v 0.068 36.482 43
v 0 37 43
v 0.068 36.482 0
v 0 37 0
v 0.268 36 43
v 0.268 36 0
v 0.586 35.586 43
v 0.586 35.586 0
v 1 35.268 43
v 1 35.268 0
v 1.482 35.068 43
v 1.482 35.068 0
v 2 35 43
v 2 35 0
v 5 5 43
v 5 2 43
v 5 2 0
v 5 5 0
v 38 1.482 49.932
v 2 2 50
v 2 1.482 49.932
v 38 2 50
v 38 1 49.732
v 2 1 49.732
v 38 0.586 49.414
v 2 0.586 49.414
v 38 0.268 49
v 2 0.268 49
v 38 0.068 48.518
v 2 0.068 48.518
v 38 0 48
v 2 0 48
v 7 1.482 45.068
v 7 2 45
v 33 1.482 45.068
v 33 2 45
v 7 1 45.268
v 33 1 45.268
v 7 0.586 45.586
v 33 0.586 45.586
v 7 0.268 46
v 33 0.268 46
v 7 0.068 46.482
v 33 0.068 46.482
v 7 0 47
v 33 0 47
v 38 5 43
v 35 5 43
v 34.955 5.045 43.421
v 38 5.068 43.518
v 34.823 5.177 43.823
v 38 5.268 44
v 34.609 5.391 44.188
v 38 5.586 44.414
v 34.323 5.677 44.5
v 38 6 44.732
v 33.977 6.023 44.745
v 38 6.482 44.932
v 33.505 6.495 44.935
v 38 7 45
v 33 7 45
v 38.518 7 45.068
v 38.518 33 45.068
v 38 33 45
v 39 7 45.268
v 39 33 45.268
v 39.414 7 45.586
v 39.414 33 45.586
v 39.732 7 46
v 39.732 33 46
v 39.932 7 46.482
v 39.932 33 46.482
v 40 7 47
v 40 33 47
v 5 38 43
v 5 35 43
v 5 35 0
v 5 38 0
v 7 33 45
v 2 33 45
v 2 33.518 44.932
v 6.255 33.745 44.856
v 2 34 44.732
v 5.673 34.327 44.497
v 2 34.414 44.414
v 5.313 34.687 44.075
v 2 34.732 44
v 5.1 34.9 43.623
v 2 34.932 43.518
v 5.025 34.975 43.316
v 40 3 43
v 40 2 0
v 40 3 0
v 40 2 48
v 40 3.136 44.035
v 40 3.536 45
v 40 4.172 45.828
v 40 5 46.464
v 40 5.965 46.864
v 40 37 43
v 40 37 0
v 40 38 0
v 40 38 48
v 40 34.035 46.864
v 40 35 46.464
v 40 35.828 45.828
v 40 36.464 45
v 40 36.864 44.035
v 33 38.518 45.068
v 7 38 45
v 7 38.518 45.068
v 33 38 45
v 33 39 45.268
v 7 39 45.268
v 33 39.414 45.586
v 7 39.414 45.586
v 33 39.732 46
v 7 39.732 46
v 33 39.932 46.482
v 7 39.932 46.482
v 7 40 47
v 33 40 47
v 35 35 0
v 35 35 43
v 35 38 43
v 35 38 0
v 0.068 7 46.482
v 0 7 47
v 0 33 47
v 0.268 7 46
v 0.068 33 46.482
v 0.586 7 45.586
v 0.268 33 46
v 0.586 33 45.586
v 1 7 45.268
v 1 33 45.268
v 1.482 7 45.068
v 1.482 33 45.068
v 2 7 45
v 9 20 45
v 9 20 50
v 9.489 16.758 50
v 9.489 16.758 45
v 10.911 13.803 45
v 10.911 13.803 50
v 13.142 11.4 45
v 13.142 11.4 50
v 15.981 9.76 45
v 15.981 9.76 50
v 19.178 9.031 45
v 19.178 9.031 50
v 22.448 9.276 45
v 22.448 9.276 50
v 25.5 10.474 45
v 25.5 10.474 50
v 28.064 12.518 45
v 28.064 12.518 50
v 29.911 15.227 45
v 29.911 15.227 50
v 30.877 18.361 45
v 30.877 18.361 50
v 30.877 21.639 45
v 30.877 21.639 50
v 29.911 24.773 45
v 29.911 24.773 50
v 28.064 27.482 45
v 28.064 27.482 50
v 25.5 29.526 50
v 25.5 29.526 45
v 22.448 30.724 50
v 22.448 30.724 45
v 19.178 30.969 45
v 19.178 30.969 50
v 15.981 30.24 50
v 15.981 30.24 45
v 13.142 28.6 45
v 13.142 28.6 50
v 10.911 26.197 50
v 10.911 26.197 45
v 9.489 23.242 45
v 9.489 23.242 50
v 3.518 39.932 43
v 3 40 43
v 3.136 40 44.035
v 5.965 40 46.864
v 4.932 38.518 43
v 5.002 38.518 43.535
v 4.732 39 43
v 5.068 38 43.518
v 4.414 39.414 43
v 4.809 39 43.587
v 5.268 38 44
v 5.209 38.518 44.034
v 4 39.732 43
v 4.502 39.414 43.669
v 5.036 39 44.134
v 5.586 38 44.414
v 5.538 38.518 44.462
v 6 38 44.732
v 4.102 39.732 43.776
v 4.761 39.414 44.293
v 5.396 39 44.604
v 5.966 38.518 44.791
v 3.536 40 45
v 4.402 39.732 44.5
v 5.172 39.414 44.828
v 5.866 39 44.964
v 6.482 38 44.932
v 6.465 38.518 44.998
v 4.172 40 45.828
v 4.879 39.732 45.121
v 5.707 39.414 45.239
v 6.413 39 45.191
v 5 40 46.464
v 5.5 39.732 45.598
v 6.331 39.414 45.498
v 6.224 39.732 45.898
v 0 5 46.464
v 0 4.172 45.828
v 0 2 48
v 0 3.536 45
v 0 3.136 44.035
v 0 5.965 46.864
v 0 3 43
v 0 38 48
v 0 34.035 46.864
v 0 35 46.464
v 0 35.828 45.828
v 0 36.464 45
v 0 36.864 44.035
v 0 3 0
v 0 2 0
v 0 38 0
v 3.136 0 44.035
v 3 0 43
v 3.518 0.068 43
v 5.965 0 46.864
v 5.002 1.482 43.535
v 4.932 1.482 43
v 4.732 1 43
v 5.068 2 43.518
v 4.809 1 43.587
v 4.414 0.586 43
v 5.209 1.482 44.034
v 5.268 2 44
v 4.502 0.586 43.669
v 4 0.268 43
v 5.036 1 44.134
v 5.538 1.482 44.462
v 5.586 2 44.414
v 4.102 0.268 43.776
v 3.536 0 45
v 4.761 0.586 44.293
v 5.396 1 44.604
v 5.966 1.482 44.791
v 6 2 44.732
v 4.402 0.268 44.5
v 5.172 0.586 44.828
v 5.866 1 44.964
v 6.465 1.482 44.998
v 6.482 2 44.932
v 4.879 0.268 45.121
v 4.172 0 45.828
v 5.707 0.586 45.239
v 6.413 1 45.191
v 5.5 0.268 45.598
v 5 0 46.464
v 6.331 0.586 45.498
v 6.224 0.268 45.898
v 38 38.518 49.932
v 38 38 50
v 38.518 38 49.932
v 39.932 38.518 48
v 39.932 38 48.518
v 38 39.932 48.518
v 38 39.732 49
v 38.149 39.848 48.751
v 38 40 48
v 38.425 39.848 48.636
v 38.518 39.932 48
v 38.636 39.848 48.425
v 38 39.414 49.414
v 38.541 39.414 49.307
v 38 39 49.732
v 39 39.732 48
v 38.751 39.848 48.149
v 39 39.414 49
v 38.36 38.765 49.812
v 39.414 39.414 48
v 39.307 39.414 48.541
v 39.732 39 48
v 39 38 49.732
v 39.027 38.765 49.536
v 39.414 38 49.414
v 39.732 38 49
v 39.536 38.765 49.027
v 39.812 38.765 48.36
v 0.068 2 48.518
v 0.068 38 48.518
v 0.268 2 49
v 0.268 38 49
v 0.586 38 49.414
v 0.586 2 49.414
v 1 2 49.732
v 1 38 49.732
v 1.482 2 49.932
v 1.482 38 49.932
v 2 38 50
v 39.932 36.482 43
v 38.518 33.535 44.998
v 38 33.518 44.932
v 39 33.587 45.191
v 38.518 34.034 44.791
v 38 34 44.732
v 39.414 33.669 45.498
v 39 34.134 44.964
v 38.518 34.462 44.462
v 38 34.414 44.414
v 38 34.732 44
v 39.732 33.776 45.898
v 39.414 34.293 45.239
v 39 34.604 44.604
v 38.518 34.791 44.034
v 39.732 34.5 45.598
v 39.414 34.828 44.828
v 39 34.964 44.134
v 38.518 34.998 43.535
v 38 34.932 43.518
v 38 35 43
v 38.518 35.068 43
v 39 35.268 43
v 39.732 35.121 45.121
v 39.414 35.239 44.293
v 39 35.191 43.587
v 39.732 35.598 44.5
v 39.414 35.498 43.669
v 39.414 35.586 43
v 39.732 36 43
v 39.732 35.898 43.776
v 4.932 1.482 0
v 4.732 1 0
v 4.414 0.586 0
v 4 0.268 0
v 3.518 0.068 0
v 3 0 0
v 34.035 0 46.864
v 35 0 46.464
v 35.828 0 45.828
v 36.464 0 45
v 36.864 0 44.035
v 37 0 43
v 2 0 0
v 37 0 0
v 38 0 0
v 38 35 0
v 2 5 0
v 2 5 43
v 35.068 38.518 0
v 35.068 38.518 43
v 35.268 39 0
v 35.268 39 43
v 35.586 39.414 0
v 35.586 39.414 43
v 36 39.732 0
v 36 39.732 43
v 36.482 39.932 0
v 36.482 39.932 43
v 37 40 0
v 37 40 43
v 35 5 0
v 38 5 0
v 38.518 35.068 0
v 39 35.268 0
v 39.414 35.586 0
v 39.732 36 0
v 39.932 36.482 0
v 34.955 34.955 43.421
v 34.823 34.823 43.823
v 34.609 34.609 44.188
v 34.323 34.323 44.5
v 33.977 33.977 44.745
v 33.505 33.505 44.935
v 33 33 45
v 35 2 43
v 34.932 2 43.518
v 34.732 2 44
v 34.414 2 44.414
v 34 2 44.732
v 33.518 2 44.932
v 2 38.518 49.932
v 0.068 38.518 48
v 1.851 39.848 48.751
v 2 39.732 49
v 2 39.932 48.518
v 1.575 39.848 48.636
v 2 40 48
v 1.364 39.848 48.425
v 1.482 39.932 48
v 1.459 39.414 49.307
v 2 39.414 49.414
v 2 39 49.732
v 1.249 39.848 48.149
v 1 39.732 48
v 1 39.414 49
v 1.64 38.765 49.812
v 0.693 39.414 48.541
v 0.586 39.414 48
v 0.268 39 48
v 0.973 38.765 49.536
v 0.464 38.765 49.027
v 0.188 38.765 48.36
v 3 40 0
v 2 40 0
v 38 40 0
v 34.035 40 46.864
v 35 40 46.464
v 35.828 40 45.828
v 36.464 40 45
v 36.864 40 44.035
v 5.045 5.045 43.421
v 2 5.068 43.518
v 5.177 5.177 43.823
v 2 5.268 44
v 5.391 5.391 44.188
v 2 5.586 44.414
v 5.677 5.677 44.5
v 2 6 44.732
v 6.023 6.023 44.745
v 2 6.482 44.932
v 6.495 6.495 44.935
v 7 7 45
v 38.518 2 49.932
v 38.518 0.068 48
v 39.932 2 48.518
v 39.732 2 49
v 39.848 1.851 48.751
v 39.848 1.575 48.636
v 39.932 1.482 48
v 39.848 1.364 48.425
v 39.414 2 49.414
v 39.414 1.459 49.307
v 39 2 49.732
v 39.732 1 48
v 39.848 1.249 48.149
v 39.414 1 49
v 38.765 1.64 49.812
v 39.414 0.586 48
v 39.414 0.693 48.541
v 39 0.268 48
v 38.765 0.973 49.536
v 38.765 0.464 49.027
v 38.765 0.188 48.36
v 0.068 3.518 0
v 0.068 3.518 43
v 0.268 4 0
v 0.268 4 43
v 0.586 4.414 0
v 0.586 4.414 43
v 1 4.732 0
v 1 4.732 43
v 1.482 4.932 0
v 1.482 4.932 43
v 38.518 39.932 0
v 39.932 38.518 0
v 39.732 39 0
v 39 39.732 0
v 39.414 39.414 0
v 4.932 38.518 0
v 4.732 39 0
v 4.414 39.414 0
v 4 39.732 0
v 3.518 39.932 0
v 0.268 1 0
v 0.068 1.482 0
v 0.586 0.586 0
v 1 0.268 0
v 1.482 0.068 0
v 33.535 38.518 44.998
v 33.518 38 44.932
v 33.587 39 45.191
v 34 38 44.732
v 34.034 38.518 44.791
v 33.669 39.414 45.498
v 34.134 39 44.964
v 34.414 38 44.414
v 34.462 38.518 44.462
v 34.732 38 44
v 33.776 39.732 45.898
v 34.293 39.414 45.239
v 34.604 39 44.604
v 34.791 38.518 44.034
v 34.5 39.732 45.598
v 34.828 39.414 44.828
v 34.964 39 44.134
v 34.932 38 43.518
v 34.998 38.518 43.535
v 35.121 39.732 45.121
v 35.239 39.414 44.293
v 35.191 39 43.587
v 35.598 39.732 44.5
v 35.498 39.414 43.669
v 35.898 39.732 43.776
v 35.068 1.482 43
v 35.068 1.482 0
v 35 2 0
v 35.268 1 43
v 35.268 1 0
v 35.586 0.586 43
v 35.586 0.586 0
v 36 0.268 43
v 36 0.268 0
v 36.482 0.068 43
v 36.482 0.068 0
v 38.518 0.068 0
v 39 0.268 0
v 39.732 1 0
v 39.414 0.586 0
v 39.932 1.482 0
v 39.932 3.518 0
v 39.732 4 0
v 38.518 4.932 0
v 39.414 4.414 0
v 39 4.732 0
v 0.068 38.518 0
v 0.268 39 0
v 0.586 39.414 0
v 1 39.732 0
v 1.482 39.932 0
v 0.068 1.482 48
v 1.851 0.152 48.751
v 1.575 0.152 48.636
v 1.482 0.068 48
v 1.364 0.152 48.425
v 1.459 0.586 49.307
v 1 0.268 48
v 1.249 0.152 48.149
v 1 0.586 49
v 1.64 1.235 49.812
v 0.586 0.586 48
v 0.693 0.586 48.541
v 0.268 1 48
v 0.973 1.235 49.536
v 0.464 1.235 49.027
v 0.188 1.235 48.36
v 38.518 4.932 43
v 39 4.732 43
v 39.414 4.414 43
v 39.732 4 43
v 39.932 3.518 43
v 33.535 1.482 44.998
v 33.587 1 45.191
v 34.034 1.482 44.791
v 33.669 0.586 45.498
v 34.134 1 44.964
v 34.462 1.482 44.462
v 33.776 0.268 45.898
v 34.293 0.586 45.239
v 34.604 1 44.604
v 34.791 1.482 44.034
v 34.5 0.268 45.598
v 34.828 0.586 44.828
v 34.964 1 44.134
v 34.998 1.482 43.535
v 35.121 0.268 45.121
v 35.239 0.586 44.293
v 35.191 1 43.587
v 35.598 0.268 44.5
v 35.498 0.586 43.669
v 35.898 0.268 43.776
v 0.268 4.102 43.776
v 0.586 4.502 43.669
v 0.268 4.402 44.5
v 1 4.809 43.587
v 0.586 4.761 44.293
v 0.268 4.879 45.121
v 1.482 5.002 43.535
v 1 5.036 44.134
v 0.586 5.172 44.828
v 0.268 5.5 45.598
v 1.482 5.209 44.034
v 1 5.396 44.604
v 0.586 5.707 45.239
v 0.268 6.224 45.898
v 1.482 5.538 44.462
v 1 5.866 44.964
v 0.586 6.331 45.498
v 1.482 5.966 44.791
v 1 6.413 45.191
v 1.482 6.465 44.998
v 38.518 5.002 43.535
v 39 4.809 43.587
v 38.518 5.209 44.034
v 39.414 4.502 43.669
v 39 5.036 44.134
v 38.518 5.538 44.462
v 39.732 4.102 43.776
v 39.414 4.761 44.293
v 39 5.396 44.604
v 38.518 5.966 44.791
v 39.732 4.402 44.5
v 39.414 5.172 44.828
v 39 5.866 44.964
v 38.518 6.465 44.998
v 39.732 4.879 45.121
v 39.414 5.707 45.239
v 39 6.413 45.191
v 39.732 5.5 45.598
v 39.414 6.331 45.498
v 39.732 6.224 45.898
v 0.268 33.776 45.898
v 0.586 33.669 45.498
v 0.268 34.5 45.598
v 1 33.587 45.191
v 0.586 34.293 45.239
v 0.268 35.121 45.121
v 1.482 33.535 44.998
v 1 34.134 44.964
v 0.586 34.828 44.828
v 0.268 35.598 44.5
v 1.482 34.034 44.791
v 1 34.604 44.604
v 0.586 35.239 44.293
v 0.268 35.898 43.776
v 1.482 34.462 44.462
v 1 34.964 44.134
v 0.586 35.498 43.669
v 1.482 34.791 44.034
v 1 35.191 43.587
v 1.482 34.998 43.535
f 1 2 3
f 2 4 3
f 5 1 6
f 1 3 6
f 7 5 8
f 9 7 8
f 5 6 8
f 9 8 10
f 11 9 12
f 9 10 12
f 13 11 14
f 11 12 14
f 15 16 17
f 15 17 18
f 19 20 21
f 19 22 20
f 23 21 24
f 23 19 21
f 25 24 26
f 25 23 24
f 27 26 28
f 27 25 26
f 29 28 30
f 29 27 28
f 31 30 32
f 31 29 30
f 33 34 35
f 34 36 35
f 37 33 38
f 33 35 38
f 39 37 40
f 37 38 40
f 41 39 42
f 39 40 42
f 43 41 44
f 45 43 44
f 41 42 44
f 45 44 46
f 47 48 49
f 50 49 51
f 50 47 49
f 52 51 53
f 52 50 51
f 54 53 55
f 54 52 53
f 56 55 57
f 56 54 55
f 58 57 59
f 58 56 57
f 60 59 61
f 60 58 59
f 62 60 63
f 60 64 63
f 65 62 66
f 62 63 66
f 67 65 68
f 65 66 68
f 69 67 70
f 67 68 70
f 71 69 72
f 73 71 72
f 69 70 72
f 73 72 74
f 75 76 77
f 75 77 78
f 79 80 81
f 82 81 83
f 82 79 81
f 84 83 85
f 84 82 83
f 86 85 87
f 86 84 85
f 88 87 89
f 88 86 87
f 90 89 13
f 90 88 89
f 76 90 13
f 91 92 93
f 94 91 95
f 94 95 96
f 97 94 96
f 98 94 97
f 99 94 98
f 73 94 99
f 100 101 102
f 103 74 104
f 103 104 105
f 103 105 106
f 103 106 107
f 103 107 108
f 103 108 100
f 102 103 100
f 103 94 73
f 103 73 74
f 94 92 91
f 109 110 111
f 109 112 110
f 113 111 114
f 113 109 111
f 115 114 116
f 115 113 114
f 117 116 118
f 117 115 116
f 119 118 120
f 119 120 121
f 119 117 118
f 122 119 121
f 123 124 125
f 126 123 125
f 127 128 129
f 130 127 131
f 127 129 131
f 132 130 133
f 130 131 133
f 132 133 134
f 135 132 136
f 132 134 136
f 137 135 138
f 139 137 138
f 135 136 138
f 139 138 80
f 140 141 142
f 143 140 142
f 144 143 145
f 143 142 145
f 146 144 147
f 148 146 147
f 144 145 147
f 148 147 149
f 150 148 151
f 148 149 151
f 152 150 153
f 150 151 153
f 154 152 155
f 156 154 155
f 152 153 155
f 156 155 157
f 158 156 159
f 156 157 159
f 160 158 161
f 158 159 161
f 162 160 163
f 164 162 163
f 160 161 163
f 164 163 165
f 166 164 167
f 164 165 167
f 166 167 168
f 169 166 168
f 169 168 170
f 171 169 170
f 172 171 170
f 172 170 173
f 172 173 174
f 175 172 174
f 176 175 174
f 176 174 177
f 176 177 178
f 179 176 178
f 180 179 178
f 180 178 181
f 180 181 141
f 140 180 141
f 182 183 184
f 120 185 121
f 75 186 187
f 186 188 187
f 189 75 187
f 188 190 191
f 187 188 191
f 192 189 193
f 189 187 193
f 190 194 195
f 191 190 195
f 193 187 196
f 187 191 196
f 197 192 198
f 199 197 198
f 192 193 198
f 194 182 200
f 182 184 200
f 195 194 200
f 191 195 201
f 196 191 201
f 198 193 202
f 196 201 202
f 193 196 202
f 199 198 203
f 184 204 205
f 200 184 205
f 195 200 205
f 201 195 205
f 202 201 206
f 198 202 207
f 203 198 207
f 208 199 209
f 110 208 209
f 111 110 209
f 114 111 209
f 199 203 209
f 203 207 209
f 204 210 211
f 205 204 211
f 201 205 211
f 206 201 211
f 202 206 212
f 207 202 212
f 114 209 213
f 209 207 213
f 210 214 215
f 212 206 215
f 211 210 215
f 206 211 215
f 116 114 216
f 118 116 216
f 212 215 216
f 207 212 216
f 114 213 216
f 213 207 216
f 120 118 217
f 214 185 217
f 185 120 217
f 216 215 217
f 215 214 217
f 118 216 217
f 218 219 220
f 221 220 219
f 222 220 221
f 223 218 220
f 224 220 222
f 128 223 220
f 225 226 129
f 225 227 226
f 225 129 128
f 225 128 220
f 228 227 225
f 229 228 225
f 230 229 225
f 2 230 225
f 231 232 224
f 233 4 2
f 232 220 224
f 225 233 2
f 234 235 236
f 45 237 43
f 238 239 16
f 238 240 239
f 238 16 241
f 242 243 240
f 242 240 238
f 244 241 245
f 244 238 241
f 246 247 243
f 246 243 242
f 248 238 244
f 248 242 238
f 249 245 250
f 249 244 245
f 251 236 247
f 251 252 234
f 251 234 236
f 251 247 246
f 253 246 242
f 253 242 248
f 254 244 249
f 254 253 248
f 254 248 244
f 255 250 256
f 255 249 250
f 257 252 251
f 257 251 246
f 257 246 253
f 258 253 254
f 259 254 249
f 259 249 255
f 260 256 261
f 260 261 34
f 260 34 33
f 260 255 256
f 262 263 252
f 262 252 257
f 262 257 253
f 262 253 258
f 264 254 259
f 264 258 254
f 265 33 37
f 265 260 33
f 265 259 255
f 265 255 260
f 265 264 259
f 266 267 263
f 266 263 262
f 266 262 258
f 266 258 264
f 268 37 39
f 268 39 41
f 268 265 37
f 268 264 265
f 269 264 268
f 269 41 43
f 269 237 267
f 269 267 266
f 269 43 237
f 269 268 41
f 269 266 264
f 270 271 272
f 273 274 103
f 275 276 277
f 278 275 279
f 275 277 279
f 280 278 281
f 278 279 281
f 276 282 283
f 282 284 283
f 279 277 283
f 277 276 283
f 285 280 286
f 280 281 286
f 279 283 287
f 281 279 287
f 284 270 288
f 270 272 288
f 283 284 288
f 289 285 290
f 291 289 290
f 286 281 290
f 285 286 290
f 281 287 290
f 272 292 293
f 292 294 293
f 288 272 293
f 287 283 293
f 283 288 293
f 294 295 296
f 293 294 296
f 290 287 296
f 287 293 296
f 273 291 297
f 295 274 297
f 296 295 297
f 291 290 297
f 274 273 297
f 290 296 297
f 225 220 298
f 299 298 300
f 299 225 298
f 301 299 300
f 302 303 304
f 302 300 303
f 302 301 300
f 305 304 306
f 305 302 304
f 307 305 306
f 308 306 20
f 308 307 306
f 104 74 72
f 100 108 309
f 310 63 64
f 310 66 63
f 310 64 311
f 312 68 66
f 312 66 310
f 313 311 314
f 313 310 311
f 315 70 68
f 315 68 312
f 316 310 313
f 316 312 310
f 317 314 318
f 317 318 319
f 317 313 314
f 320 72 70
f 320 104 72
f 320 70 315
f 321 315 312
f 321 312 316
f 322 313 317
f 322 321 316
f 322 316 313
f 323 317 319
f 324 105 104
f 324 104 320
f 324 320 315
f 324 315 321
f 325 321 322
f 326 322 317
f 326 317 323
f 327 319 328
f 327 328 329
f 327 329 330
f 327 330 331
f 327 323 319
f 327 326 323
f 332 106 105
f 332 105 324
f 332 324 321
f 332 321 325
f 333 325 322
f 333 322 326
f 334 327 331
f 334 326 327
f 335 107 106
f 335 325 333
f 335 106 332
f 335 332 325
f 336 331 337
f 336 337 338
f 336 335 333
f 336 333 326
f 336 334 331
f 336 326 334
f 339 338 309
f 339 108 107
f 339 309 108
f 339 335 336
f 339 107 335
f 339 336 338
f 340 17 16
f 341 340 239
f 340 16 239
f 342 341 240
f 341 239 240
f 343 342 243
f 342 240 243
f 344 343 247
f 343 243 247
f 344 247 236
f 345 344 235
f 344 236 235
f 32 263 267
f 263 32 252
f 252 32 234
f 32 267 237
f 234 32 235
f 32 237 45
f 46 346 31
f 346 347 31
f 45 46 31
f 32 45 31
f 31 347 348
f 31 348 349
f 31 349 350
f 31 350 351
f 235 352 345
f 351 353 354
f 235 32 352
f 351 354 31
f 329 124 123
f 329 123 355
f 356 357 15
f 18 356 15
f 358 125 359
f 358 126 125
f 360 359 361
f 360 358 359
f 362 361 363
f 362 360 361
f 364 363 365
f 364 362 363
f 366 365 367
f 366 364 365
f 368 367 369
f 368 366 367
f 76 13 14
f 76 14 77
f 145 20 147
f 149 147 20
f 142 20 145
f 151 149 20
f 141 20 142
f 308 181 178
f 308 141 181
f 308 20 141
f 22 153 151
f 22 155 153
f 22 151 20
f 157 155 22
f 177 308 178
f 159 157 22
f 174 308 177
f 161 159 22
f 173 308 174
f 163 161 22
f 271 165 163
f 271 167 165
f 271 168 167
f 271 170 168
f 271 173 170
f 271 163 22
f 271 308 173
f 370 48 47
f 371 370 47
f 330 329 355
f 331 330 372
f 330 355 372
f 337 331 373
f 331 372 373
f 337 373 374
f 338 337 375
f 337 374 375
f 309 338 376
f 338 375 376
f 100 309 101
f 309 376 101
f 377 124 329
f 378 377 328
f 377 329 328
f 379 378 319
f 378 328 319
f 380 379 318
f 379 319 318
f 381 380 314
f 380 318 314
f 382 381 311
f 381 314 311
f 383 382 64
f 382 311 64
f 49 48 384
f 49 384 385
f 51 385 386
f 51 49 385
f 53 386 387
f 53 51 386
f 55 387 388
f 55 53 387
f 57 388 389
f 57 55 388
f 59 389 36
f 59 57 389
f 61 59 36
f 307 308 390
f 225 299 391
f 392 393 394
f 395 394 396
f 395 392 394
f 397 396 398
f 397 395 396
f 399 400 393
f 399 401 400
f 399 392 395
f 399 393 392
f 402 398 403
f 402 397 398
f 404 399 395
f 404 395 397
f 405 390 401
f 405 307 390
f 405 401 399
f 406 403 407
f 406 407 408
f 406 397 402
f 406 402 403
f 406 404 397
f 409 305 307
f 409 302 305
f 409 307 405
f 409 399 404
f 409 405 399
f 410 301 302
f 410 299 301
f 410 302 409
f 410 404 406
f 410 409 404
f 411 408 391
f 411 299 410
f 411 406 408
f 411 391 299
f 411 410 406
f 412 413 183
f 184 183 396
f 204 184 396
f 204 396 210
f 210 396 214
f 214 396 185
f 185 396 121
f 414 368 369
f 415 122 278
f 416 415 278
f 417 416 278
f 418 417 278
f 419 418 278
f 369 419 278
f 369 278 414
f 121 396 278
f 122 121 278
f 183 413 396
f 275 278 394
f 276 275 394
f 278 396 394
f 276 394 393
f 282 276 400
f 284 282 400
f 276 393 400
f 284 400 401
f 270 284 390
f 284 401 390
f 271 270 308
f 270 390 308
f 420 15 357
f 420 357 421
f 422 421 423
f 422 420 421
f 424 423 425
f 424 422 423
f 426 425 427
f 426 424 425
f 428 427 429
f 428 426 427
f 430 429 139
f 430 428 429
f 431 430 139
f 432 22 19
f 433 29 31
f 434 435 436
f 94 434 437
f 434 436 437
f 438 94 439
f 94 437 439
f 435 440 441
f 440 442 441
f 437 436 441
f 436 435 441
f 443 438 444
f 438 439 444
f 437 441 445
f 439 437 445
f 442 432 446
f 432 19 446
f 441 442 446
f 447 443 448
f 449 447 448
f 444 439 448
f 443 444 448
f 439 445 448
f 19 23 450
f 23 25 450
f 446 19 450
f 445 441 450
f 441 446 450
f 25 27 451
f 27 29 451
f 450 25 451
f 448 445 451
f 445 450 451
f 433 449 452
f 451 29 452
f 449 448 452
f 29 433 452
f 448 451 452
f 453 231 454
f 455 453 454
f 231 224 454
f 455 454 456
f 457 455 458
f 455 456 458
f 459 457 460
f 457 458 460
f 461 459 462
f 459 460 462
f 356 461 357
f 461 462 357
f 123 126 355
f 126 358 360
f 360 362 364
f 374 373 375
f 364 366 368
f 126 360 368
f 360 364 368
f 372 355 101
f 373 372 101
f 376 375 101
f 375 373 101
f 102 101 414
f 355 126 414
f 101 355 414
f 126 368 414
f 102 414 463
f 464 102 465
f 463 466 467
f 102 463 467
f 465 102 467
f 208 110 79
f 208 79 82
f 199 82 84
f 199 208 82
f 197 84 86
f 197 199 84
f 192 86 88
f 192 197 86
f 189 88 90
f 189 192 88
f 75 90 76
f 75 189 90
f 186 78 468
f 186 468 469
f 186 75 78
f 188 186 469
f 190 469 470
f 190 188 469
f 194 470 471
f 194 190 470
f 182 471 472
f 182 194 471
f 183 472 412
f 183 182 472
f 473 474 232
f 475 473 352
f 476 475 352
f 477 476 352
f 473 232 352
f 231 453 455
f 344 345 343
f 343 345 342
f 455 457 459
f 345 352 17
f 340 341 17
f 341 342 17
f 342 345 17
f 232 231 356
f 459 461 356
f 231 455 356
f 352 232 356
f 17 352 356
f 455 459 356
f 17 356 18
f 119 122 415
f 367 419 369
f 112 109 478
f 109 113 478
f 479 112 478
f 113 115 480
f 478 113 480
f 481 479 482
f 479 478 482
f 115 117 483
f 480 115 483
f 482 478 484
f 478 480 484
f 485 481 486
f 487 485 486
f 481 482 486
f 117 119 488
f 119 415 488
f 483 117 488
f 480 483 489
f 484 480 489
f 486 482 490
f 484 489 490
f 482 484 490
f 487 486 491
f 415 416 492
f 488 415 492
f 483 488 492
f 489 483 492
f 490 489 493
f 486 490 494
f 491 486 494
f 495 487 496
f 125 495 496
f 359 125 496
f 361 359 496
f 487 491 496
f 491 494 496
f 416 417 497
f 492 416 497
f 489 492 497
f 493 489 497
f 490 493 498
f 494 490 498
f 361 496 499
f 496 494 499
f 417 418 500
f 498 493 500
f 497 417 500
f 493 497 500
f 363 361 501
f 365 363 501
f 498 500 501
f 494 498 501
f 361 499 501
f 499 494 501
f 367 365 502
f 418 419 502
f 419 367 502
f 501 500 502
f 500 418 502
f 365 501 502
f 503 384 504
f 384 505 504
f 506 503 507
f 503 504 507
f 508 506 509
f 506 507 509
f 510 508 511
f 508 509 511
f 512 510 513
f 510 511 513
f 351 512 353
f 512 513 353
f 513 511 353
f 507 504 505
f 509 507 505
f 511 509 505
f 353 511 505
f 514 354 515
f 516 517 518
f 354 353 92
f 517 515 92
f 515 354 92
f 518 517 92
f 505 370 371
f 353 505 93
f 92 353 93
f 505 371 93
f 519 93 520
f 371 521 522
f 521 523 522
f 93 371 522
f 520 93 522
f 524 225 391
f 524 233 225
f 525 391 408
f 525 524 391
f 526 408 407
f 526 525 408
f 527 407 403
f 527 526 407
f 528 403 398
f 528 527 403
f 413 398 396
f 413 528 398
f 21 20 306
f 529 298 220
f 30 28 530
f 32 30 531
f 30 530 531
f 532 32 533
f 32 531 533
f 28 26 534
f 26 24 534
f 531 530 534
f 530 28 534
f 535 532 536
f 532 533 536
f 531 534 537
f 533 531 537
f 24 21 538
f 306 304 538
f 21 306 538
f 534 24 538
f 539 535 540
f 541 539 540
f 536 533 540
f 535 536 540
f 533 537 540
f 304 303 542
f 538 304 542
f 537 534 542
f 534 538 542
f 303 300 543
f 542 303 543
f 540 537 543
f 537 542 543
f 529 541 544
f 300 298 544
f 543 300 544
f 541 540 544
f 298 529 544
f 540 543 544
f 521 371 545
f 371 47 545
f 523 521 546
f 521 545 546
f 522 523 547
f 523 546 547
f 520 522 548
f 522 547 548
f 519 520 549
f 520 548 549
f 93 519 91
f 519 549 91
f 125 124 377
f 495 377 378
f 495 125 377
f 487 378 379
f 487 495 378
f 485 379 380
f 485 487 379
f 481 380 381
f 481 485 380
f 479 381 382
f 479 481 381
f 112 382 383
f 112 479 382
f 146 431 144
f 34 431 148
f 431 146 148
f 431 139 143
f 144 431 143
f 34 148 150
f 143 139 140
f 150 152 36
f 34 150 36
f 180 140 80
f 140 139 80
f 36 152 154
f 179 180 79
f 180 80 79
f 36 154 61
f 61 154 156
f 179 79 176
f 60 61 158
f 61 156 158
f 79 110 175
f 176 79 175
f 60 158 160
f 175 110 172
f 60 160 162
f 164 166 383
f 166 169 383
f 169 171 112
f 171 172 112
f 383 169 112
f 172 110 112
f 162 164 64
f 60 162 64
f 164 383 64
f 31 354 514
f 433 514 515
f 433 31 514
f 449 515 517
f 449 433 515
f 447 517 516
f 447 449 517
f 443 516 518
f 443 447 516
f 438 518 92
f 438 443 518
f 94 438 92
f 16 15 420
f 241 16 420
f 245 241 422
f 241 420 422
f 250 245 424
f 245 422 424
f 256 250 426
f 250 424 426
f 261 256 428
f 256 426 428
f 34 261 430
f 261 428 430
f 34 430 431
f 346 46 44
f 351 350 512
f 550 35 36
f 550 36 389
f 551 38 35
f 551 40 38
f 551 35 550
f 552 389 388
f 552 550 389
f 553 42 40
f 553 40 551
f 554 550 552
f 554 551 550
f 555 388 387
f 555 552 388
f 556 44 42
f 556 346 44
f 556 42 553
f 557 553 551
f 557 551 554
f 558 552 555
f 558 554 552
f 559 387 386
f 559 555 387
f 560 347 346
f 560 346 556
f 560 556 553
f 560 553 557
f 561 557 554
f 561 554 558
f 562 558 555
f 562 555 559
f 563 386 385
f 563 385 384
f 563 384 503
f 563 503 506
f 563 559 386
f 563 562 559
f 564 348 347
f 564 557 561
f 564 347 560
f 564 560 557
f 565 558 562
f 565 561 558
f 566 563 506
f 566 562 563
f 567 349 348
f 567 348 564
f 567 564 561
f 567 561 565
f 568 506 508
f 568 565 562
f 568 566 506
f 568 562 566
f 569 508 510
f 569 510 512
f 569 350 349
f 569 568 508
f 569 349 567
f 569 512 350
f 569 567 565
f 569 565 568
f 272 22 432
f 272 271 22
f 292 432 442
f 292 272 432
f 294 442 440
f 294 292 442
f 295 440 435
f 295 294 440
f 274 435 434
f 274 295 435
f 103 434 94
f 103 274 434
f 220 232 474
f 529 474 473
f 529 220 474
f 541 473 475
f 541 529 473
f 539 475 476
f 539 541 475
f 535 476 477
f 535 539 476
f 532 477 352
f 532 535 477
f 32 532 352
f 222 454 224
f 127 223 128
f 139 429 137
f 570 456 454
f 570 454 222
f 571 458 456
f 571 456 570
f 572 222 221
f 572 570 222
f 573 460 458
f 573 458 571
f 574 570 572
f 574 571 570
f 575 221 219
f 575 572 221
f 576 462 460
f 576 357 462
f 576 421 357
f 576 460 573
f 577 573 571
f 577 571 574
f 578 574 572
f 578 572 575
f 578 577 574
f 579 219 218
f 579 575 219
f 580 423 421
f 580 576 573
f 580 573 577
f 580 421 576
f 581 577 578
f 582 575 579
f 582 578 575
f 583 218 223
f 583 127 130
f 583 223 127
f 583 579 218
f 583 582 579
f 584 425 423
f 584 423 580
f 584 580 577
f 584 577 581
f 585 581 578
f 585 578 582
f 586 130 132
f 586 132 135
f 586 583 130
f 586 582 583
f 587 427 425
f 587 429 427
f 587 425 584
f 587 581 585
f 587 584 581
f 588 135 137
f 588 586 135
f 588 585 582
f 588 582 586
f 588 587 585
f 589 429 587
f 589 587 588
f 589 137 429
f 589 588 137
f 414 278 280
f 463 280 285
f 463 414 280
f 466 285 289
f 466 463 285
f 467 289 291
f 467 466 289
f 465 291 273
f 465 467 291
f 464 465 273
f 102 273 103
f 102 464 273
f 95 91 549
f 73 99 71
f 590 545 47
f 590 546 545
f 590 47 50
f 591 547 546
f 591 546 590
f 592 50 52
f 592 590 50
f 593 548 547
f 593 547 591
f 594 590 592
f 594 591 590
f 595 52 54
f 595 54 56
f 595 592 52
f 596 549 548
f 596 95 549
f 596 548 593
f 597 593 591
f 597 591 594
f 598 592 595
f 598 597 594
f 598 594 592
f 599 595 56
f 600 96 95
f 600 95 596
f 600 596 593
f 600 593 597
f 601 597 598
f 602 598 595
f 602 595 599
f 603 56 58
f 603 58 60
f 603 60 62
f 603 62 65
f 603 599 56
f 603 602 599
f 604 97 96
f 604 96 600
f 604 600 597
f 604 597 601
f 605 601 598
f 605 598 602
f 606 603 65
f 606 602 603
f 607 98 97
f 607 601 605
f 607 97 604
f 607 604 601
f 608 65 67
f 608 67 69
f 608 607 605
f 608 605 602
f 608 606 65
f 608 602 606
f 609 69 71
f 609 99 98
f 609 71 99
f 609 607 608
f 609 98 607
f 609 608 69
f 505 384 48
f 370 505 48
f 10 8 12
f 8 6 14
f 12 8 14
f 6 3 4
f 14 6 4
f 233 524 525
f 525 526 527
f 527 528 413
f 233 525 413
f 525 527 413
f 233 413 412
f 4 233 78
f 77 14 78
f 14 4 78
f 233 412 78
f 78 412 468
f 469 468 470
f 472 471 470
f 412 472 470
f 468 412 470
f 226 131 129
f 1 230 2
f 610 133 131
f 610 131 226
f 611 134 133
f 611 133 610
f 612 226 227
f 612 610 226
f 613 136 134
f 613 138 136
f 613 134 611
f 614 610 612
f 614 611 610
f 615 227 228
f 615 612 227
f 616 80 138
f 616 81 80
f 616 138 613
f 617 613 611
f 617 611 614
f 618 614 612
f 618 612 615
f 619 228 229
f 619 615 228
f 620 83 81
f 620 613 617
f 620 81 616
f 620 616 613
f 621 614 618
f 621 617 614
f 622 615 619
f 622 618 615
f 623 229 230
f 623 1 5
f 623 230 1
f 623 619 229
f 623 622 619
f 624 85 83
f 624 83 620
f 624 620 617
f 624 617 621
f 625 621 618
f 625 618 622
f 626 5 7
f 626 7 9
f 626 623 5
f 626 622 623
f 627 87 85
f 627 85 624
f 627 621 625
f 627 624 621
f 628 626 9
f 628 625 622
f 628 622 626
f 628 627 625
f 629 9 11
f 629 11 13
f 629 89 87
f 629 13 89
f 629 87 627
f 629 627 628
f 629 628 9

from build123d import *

# Parameters (mm, degrees)
F0_W     = 5
F0_H     = 5
F1_DEPTH = 50
F2_W     = 40
F2_H     = 40
F3_DEPTH = 5
F4_F1_R  = 2
F4_F2_R  = 2
F5_D     = 22
F5_DEPTH = 50
F5_START = 45
F5_TIP   = 6.6094668093


with BuildPart() as f1:
    # F0 (on Top) → F1 (new body)
    with BuildSketch(Plane.XY):
        with Locations((2.5, 2.5)):
            Rectangle(F0_W, F0_H)
    extrude(amount=F1_DEPTH)



with BuildPart() as f1b:
    # F0 (on Top) → F1, piece 2 (new body)
    with BuildSketch(Plane.XY):
        with Locations((37.5, 2.5)):
            Rectangle(F0_W, F0_H)
    extrude(amount=F1_DEPTH)


with BuildPart() as f1c:
    # F0 (on Top) → F1, piece 3 (new body)
    with BuildSketch(Plane.XY):
        with Locations((37.5, 37.5)):
            Rectangle(F0_W, F0_H)
    extrude(amount=F1_DEPTH)


with BuildPart() as f1d:
    # F0 (on Top) → F1, piece 4 (new body)
    with BuildSketch(Plane.XY):
        with Locations((2.5, 37.5)):
            Rectangle(F0_W, F0_H)
    extrude(amount=F1_DEPTH)


with BuildPart() as f1_1:
    add(f1.part)

    add(f1b.part)  # F3 merges F1b

    add(f1c.part)  # F3 merges F1c

    add(f1d.part)  # F3 merges F1d
    # F2 (on face) → F3 (join)
    with BuildSketch(Plane.XY.offset(50)):
        with Locations((20, 20)):
            Rectangle(F2_W, F2_H)
    extrude(amount=-F3_DEPTH)

    # F4: fillet of radius 2 on 20 edges, made by hand

    # F4_f1
    f4_f1_edges = [f1_1.edges().sort_by_distance(p)[0] for p in [
        (37.5, 5, 45),
        (35, 2.5, 45),
        (5, 2.5, 45),
        (2.5, 5, 45),
        (2.5, 35, 45),
        (5, 37.5, 45),
        (35, 37.5, 45),
        (37.5, 35, 45),
    ]]
    fillet(f4_f1_edges, radius=F4_F1_R)

    # F4_f2
    f4_f2_edges = [f1_1.edges().sort_by_distance(p)[0] for p in [
        (0, 20, 50),
        (20, 0, 50),
        (40, 20, 50),
        (20, 40, 50),
        (0, 0, 25),
        (40, 0, 25),
        (40, 40, 25),
        (20, 0, 45),
        (0, 20, 45),
        (20, 40, 45),
        (40, 20, 45),
        (0, 40, 25),
        (40, 5.5857864376, 44.4142135624),
        (40, 34.4142135624, 44.4142135624),
        (34.4142135624, 40, 44.4142135624),
        (5.5857864376, 40, 44.4142135624),
        (0, 34.4142135624, 44.4142135624),
        (0, 5.5857864376, 44.4142135624),
        (5.5857864376, 0, 44.4142135624),
        (34.4142135624, 0, 44.4142135624),
    ]]
    fillet(f4_f2_edges, radius=F4_F2_R)

    # F5
    # its depths count from where the whole tool has entered the part; down to there all is cleared
    with Locations(Plane(origin=(0, 0, 0), x_dir=(1, 0, 0), z_dir=(0, 0, -1)).offset(-F5_START)):
        with Locations((20, -20)):
            Hole(F5_D / 2, depth=F5_DEPTH)
            with Locations((0, 0, -(F5_DEPTH + F5_TIP / 2))):  # 118° drill point
                Cone(0, F5_D / 2, F5_TIP, mode=Mode.SUBTRACT)


solid = f1_1.part
